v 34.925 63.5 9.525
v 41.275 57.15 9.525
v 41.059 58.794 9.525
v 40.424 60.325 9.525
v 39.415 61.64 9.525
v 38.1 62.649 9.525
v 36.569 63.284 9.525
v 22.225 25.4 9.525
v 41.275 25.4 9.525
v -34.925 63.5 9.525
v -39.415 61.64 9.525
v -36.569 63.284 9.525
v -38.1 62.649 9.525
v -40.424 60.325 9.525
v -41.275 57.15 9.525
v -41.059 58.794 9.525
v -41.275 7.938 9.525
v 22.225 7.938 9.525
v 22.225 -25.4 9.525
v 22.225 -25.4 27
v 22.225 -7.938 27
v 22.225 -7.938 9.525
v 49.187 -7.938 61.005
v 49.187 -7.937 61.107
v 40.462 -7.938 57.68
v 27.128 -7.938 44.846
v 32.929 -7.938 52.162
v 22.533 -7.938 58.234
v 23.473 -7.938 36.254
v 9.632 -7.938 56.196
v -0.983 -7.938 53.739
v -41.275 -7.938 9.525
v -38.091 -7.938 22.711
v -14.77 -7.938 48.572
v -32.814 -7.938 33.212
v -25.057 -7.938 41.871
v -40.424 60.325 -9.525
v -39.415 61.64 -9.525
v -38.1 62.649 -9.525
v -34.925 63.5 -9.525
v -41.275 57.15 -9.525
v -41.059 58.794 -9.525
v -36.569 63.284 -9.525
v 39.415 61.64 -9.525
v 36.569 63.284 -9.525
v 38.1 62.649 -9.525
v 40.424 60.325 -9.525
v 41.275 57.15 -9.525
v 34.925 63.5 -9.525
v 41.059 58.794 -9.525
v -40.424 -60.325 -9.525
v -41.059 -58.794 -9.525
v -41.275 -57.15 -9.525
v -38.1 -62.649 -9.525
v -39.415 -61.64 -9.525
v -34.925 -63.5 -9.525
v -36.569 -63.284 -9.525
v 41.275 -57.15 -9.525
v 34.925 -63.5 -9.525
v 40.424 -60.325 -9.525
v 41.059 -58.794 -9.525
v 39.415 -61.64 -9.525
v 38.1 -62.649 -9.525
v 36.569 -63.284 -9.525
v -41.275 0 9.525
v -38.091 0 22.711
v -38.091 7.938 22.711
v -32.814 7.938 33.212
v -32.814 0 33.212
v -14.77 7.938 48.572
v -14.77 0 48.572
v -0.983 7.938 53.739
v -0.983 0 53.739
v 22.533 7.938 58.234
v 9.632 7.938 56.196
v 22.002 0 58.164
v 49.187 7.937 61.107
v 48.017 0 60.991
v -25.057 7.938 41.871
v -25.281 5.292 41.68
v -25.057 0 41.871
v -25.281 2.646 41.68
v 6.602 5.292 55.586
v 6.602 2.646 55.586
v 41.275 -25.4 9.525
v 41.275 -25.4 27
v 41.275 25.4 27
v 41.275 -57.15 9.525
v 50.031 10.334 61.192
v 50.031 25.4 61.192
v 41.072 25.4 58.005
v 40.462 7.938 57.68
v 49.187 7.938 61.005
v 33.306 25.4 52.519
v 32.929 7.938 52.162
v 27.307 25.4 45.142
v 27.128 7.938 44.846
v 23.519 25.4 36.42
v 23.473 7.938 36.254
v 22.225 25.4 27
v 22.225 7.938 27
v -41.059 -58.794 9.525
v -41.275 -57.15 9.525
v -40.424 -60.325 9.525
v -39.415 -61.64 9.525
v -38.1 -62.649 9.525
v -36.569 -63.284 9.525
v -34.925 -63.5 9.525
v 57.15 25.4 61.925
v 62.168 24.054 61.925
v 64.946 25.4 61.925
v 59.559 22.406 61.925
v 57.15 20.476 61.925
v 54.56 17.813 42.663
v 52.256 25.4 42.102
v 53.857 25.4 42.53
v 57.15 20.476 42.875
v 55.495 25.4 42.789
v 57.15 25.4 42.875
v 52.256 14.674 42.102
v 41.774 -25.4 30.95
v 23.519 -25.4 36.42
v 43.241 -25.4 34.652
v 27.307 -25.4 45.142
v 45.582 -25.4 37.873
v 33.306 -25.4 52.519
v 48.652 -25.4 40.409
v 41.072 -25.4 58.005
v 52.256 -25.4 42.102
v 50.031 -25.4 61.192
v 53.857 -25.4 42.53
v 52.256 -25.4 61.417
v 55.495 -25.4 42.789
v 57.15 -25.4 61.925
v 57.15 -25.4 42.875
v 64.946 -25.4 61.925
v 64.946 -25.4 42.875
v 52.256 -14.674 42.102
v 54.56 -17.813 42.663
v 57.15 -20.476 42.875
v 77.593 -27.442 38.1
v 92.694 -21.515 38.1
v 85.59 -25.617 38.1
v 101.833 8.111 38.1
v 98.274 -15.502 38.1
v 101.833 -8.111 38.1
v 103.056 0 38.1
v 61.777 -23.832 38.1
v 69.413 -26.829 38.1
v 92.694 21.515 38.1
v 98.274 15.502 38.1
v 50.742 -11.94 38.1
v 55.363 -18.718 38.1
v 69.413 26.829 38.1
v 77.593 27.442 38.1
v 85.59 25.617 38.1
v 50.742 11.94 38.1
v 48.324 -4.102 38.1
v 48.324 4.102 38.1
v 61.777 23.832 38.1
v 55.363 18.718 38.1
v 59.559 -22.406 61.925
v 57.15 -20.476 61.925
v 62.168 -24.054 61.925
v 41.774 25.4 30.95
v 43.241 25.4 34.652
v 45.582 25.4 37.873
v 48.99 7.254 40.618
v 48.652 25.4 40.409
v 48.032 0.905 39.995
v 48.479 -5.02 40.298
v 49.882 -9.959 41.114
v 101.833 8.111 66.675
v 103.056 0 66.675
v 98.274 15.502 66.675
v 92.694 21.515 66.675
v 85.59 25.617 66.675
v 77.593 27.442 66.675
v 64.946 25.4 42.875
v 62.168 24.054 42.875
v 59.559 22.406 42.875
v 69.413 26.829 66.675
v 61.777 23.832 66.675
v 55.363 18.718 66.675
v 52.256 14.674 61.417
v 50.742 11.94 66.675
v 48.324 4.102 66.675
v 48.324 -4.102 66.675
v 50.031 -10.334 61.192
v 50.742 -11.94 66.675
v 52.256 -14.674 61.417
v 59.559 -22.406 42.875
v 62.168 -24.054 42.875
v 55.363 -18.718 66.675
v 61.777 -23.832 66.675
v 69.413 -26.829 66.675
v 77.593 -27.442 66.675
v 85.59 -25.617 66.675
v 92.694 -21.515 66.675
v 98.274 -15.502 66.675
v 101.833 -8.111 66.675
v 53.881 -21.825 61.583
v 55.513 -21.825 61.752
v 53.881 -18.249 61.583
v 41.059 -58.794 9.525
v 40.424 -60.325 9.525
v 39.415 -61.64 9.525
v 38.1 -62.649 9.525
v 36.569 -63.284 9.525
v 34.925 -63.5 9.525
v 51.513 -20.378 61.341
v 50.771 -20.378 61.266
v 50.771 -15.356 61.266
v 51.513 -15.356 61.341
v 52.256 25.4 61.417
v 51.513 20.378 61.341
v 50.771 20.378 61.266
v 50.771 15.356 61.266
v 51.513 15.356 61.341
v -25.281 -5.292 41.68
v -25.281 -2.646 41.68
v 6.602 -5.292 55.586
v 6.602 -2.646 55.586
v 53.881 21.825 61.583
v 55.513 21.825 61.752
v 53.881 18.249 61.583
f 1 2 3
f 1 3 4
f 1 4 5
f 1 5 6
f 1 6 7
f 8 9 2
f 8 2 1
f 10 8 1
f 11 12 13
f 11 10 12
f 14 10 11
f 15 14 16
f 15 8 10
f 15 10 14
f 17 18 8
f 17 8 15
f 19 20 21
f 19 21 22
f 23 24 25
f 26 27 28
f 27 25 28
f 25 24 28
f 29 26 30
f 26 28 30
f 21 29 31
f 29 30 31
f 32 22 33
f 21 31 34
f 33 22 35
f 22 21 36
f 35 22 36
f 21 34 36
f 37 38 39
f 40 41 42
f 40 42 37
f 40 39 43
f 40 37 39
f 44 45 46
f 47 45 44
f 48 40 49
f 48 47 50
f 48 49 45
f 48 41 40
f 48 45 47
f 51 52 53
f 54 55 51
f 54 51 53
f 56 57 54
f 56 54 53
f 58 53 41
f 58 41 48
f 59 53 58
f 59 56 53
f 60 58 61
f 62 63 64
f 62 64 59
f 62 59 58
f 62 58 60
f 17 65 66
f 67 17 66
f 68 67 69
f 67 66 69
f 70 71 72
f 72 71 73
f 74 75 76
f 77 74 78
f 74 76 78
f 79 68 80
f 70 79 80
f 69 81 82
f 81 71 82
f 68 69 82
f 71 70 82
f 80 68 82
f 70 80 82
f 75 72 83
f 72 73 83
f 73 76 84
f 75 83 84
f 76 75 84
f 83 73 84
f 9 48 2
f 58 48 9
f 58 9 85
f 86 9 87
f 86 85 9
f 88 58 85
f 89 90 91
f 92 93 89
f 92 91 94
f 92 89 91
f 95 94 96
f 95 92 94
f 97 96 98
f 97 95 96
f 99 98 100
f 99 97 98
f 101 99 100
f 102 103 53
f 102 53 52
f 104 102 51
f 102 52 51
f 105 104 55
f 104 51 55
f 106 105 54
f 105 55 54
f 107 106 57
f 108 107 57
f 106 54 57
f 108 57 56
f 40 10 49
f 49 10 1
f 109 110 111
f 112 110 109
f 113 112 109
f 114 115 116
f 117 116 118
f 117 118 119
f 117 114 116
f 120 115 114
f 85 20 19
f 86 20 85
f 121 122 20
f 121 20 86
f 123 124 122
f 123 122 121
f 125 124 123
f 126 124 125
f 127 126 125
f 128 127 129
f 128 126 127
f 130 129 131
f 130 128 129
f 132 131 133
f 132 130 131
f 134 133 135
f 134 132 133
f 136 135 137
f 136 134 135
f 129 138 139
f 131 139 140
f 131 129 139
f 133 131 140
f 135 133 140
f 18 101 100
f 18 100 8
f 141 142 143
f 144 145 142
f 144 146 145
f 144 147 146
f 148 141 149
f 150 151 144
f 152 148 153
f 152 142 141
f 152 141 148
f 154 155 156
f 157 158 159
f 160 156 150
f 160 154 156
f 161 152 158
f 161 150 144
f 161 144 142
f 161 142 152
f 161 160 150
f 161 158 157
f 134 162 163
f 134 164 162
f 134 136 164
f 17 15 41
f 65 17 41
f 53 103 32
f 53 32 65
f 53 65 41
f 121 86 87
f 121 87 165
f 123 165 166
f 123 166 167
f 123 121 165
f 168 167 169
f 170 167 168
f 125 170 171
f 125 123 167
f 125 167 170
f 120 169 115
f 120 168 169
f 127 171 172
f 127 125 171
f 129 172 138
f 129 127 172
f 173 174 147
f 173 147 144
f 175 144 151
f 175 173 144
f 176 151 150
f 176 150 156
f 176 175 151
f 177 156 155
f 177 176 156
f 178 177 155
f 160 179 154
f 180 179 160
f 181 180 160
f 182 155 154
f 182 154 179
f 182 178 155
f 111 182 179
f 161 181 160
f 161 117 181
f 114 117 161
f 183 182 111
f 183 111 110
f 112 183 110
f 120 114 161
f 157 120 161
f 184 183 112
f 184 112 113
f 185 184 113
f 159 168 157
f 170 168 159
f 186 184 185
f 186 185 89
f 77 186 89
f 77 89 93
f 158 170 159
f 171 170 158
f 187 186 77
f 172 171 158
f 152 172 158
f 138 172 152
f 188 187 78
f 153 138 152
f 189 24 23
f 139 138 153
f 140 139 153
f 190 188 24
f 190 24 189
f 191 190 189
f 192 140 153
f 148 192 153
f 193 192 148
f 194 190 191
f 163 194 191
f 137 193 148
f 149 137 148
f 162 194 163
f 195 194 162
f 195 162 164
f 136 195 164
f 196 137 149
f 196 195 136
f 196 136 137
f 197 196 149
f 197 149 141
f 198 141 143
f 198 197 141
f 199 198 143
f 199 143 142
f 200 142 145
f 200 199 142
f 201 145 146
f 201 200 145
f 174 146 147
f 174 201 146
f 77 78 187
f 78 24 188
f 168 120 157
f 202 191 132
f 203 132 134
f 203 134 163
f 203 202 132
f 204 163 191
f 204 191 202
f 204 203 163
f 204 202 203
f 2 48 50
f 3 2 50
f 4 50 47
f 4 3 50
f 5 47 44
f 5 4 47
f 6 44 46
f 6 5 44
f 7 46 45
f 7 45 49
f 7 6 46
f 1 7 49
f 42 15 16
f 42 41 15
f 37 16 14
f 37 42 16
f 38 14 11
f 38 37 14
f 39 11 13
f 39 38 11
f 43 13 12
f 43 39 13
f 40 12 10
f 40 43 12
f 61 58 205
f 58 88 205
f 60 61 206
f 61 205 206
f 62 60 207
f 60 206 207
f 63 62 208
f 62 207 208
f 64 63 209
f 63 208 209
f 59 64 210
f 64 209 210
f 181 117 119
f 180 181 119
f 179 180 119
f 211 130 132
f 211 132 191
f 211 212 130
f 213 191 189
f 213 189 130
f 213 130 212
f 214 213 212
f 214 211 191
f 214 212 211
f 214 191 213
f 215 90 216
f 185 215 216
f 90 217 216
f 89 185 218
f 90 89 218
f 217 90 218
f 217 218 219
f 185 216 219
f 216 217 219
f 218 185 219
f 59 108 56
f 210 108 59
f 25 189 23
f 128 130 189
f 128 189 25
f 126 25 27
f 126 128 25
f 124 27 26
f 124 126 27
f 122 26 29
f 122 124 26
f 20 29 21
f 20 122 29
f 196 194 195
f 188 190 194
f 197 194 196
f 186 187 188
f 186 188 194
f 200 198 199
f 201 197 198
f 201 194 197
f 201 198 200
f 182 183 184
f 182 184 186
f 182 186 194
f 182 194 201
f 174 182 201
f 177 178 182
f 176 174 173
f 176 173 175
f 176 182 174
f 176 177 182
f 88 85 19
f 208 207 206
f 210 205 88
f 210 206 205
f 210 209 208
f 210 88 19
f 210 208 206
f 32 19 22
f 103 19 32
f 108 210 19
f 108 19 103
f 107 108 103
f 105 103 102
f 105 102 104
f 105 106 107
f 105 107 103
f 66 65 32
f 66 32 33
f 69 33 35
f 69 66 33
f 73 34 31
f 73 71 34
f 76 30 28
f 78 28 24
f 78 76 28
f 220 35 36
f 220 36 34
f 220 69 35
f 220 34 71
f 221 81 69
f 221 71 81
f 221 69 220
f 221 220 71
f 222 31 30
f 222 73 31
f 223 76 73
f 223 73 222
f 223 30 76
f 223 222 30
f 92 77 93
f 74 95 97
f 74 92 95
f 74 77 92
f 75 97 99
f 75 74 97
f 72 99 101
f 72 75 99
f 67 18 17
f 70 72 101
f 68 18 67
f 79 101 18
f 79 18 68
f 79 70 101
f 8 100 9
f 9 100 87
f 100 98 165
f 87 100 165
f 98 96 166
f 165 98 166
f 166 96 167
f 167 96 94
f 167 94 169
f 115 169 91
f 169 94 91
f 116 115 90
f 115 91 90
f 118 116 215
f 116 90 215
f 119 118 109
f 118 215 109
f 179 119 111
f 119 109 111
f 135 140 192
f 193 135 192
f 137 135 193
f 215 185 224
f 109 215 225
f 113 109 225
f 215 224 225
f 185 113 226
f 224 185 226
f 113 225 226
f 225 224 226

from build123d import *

# Parameters (mm, degrees)
F1_DEPTH = 63.5
F2_DEPTH = 25.4
F3_DEPTH = 7.9375
F5_R     = 6.35


with BuildPart() as f1:
    # F0 (on Front) → F1 (new body, symmetric)
    with BuildSketch(Plane.XZ):
        Polygon((22.225, 9.525), (-41.275, 9.525), (-41.275, -9.525), (41.275, -9.525), (41.275, 9.525), align=None)
    extrude(amount=F1_DEPTH, both=True)

    # F0 (on Front) → F2 (join, symmetric)
    with BuildSketch(Plane.XZ):
        with BuildLine():
            Line((22.225, 27.0002), (22.225, 9.525))
            Line((22.225, 9.525), (41.275, 9.525))
            Line((41.275, 9.525), (41.275, 27.0002))
            ThreePointArc((41.275, 27.0002), (44.310306, 36.336039), (52.255521, 42.101846))
            Line((52.255521, 42.101846), (52.255521, 61.416567))
            add(Edge.make_bspline(
                [(50.030877, 61.19192), (50.770384, 61.266108), (51.511964, 61.34093), (52.255521, 61.416567)],
                knots=[106.14327, 106.14327, 106.14327, 106.14327, 107.828168, 107.828168, 107.828168, 107.828168], degree=3))
            ThreePointArc((50.030877, 61.19192), (30.053958, 49.035629), (22.225, 27.0002))
        make_face()
        with BuildLine():
            add(Edge.make_bspline(
                [(52.255521, 61.416567), (53.877929, 61.581604), (55.509751, 61.750523), (57.15, 61.9252)],
                knots=[107.828168, 107.828168, 107.828168, 107.828168, 111.504536, 111.504536, 111.504536, 111.504536], degree=3))
            Line((52.255521, 61.416567), (52.255521, 42.101846))
            ThreePointArc((52.255521, 42.101846), (54.6724, 42.68067), (57.15, 42.8752))
            Line((57.15, 42.8752), (75.536245, 42.8752))
            Line((75.536245, 42.8752), (75.536245, 61.9252))
            Line((75.536245, 61.9252), (57.15, 61.9252))
        make_face()
    extrude(amount=F2_DEPTH, both=True)

    # F0 (on Front) → F3 (join, symmetric)
    with BuildSketch(Plane.XZ):
        with BuildLine():
            add(Edge.make_bspline(
                [(-41.275, 9.525), (-34.917098, 54.362489), (3.444235, 56.518327), (50.030877, 61.19192)],
                knots=[0, 0, 0, 0, 106.14327, 106.14327, 106.14327, 106.14327], degree=3))
            Line((-41.275, 9.525), (22.225, 9.525))
            Line((22.225, 9.525), (22.225, 27.0002))
            ThreePointArc((22.225, 27.0002), (30.053958, 49.035629), (50.030877, 61.19192))
        make_face()
    extrude(amount=F3_DEPTH, both=True)

    # F0 (on Front) → F4 (revolve)
    with BuildSketch(Plane.XZ):
        Polygon((103.055521, 66.675), (75.536245, 66.675), (75.536245, 61.9252), (75.536245, 42.8752), (75.536245, 38.1), (103.055521, 38.1), align=None)
    revolve(axis=Axis((75.536245, 0, 52.3875), (0, 0, 1)))

    # F5
    f5_edges = [f1.edges().sort_by_distance(p)[0] for p in [
        (41.275, -63.5, 0),
        (-41.275, -63.5, 0),
        (41.275, 63.5, 0),
        (-41.275, 63.5, 0),
    ]]
    fillet(f5_edges, radius=F5_R)


solid = f1.part
